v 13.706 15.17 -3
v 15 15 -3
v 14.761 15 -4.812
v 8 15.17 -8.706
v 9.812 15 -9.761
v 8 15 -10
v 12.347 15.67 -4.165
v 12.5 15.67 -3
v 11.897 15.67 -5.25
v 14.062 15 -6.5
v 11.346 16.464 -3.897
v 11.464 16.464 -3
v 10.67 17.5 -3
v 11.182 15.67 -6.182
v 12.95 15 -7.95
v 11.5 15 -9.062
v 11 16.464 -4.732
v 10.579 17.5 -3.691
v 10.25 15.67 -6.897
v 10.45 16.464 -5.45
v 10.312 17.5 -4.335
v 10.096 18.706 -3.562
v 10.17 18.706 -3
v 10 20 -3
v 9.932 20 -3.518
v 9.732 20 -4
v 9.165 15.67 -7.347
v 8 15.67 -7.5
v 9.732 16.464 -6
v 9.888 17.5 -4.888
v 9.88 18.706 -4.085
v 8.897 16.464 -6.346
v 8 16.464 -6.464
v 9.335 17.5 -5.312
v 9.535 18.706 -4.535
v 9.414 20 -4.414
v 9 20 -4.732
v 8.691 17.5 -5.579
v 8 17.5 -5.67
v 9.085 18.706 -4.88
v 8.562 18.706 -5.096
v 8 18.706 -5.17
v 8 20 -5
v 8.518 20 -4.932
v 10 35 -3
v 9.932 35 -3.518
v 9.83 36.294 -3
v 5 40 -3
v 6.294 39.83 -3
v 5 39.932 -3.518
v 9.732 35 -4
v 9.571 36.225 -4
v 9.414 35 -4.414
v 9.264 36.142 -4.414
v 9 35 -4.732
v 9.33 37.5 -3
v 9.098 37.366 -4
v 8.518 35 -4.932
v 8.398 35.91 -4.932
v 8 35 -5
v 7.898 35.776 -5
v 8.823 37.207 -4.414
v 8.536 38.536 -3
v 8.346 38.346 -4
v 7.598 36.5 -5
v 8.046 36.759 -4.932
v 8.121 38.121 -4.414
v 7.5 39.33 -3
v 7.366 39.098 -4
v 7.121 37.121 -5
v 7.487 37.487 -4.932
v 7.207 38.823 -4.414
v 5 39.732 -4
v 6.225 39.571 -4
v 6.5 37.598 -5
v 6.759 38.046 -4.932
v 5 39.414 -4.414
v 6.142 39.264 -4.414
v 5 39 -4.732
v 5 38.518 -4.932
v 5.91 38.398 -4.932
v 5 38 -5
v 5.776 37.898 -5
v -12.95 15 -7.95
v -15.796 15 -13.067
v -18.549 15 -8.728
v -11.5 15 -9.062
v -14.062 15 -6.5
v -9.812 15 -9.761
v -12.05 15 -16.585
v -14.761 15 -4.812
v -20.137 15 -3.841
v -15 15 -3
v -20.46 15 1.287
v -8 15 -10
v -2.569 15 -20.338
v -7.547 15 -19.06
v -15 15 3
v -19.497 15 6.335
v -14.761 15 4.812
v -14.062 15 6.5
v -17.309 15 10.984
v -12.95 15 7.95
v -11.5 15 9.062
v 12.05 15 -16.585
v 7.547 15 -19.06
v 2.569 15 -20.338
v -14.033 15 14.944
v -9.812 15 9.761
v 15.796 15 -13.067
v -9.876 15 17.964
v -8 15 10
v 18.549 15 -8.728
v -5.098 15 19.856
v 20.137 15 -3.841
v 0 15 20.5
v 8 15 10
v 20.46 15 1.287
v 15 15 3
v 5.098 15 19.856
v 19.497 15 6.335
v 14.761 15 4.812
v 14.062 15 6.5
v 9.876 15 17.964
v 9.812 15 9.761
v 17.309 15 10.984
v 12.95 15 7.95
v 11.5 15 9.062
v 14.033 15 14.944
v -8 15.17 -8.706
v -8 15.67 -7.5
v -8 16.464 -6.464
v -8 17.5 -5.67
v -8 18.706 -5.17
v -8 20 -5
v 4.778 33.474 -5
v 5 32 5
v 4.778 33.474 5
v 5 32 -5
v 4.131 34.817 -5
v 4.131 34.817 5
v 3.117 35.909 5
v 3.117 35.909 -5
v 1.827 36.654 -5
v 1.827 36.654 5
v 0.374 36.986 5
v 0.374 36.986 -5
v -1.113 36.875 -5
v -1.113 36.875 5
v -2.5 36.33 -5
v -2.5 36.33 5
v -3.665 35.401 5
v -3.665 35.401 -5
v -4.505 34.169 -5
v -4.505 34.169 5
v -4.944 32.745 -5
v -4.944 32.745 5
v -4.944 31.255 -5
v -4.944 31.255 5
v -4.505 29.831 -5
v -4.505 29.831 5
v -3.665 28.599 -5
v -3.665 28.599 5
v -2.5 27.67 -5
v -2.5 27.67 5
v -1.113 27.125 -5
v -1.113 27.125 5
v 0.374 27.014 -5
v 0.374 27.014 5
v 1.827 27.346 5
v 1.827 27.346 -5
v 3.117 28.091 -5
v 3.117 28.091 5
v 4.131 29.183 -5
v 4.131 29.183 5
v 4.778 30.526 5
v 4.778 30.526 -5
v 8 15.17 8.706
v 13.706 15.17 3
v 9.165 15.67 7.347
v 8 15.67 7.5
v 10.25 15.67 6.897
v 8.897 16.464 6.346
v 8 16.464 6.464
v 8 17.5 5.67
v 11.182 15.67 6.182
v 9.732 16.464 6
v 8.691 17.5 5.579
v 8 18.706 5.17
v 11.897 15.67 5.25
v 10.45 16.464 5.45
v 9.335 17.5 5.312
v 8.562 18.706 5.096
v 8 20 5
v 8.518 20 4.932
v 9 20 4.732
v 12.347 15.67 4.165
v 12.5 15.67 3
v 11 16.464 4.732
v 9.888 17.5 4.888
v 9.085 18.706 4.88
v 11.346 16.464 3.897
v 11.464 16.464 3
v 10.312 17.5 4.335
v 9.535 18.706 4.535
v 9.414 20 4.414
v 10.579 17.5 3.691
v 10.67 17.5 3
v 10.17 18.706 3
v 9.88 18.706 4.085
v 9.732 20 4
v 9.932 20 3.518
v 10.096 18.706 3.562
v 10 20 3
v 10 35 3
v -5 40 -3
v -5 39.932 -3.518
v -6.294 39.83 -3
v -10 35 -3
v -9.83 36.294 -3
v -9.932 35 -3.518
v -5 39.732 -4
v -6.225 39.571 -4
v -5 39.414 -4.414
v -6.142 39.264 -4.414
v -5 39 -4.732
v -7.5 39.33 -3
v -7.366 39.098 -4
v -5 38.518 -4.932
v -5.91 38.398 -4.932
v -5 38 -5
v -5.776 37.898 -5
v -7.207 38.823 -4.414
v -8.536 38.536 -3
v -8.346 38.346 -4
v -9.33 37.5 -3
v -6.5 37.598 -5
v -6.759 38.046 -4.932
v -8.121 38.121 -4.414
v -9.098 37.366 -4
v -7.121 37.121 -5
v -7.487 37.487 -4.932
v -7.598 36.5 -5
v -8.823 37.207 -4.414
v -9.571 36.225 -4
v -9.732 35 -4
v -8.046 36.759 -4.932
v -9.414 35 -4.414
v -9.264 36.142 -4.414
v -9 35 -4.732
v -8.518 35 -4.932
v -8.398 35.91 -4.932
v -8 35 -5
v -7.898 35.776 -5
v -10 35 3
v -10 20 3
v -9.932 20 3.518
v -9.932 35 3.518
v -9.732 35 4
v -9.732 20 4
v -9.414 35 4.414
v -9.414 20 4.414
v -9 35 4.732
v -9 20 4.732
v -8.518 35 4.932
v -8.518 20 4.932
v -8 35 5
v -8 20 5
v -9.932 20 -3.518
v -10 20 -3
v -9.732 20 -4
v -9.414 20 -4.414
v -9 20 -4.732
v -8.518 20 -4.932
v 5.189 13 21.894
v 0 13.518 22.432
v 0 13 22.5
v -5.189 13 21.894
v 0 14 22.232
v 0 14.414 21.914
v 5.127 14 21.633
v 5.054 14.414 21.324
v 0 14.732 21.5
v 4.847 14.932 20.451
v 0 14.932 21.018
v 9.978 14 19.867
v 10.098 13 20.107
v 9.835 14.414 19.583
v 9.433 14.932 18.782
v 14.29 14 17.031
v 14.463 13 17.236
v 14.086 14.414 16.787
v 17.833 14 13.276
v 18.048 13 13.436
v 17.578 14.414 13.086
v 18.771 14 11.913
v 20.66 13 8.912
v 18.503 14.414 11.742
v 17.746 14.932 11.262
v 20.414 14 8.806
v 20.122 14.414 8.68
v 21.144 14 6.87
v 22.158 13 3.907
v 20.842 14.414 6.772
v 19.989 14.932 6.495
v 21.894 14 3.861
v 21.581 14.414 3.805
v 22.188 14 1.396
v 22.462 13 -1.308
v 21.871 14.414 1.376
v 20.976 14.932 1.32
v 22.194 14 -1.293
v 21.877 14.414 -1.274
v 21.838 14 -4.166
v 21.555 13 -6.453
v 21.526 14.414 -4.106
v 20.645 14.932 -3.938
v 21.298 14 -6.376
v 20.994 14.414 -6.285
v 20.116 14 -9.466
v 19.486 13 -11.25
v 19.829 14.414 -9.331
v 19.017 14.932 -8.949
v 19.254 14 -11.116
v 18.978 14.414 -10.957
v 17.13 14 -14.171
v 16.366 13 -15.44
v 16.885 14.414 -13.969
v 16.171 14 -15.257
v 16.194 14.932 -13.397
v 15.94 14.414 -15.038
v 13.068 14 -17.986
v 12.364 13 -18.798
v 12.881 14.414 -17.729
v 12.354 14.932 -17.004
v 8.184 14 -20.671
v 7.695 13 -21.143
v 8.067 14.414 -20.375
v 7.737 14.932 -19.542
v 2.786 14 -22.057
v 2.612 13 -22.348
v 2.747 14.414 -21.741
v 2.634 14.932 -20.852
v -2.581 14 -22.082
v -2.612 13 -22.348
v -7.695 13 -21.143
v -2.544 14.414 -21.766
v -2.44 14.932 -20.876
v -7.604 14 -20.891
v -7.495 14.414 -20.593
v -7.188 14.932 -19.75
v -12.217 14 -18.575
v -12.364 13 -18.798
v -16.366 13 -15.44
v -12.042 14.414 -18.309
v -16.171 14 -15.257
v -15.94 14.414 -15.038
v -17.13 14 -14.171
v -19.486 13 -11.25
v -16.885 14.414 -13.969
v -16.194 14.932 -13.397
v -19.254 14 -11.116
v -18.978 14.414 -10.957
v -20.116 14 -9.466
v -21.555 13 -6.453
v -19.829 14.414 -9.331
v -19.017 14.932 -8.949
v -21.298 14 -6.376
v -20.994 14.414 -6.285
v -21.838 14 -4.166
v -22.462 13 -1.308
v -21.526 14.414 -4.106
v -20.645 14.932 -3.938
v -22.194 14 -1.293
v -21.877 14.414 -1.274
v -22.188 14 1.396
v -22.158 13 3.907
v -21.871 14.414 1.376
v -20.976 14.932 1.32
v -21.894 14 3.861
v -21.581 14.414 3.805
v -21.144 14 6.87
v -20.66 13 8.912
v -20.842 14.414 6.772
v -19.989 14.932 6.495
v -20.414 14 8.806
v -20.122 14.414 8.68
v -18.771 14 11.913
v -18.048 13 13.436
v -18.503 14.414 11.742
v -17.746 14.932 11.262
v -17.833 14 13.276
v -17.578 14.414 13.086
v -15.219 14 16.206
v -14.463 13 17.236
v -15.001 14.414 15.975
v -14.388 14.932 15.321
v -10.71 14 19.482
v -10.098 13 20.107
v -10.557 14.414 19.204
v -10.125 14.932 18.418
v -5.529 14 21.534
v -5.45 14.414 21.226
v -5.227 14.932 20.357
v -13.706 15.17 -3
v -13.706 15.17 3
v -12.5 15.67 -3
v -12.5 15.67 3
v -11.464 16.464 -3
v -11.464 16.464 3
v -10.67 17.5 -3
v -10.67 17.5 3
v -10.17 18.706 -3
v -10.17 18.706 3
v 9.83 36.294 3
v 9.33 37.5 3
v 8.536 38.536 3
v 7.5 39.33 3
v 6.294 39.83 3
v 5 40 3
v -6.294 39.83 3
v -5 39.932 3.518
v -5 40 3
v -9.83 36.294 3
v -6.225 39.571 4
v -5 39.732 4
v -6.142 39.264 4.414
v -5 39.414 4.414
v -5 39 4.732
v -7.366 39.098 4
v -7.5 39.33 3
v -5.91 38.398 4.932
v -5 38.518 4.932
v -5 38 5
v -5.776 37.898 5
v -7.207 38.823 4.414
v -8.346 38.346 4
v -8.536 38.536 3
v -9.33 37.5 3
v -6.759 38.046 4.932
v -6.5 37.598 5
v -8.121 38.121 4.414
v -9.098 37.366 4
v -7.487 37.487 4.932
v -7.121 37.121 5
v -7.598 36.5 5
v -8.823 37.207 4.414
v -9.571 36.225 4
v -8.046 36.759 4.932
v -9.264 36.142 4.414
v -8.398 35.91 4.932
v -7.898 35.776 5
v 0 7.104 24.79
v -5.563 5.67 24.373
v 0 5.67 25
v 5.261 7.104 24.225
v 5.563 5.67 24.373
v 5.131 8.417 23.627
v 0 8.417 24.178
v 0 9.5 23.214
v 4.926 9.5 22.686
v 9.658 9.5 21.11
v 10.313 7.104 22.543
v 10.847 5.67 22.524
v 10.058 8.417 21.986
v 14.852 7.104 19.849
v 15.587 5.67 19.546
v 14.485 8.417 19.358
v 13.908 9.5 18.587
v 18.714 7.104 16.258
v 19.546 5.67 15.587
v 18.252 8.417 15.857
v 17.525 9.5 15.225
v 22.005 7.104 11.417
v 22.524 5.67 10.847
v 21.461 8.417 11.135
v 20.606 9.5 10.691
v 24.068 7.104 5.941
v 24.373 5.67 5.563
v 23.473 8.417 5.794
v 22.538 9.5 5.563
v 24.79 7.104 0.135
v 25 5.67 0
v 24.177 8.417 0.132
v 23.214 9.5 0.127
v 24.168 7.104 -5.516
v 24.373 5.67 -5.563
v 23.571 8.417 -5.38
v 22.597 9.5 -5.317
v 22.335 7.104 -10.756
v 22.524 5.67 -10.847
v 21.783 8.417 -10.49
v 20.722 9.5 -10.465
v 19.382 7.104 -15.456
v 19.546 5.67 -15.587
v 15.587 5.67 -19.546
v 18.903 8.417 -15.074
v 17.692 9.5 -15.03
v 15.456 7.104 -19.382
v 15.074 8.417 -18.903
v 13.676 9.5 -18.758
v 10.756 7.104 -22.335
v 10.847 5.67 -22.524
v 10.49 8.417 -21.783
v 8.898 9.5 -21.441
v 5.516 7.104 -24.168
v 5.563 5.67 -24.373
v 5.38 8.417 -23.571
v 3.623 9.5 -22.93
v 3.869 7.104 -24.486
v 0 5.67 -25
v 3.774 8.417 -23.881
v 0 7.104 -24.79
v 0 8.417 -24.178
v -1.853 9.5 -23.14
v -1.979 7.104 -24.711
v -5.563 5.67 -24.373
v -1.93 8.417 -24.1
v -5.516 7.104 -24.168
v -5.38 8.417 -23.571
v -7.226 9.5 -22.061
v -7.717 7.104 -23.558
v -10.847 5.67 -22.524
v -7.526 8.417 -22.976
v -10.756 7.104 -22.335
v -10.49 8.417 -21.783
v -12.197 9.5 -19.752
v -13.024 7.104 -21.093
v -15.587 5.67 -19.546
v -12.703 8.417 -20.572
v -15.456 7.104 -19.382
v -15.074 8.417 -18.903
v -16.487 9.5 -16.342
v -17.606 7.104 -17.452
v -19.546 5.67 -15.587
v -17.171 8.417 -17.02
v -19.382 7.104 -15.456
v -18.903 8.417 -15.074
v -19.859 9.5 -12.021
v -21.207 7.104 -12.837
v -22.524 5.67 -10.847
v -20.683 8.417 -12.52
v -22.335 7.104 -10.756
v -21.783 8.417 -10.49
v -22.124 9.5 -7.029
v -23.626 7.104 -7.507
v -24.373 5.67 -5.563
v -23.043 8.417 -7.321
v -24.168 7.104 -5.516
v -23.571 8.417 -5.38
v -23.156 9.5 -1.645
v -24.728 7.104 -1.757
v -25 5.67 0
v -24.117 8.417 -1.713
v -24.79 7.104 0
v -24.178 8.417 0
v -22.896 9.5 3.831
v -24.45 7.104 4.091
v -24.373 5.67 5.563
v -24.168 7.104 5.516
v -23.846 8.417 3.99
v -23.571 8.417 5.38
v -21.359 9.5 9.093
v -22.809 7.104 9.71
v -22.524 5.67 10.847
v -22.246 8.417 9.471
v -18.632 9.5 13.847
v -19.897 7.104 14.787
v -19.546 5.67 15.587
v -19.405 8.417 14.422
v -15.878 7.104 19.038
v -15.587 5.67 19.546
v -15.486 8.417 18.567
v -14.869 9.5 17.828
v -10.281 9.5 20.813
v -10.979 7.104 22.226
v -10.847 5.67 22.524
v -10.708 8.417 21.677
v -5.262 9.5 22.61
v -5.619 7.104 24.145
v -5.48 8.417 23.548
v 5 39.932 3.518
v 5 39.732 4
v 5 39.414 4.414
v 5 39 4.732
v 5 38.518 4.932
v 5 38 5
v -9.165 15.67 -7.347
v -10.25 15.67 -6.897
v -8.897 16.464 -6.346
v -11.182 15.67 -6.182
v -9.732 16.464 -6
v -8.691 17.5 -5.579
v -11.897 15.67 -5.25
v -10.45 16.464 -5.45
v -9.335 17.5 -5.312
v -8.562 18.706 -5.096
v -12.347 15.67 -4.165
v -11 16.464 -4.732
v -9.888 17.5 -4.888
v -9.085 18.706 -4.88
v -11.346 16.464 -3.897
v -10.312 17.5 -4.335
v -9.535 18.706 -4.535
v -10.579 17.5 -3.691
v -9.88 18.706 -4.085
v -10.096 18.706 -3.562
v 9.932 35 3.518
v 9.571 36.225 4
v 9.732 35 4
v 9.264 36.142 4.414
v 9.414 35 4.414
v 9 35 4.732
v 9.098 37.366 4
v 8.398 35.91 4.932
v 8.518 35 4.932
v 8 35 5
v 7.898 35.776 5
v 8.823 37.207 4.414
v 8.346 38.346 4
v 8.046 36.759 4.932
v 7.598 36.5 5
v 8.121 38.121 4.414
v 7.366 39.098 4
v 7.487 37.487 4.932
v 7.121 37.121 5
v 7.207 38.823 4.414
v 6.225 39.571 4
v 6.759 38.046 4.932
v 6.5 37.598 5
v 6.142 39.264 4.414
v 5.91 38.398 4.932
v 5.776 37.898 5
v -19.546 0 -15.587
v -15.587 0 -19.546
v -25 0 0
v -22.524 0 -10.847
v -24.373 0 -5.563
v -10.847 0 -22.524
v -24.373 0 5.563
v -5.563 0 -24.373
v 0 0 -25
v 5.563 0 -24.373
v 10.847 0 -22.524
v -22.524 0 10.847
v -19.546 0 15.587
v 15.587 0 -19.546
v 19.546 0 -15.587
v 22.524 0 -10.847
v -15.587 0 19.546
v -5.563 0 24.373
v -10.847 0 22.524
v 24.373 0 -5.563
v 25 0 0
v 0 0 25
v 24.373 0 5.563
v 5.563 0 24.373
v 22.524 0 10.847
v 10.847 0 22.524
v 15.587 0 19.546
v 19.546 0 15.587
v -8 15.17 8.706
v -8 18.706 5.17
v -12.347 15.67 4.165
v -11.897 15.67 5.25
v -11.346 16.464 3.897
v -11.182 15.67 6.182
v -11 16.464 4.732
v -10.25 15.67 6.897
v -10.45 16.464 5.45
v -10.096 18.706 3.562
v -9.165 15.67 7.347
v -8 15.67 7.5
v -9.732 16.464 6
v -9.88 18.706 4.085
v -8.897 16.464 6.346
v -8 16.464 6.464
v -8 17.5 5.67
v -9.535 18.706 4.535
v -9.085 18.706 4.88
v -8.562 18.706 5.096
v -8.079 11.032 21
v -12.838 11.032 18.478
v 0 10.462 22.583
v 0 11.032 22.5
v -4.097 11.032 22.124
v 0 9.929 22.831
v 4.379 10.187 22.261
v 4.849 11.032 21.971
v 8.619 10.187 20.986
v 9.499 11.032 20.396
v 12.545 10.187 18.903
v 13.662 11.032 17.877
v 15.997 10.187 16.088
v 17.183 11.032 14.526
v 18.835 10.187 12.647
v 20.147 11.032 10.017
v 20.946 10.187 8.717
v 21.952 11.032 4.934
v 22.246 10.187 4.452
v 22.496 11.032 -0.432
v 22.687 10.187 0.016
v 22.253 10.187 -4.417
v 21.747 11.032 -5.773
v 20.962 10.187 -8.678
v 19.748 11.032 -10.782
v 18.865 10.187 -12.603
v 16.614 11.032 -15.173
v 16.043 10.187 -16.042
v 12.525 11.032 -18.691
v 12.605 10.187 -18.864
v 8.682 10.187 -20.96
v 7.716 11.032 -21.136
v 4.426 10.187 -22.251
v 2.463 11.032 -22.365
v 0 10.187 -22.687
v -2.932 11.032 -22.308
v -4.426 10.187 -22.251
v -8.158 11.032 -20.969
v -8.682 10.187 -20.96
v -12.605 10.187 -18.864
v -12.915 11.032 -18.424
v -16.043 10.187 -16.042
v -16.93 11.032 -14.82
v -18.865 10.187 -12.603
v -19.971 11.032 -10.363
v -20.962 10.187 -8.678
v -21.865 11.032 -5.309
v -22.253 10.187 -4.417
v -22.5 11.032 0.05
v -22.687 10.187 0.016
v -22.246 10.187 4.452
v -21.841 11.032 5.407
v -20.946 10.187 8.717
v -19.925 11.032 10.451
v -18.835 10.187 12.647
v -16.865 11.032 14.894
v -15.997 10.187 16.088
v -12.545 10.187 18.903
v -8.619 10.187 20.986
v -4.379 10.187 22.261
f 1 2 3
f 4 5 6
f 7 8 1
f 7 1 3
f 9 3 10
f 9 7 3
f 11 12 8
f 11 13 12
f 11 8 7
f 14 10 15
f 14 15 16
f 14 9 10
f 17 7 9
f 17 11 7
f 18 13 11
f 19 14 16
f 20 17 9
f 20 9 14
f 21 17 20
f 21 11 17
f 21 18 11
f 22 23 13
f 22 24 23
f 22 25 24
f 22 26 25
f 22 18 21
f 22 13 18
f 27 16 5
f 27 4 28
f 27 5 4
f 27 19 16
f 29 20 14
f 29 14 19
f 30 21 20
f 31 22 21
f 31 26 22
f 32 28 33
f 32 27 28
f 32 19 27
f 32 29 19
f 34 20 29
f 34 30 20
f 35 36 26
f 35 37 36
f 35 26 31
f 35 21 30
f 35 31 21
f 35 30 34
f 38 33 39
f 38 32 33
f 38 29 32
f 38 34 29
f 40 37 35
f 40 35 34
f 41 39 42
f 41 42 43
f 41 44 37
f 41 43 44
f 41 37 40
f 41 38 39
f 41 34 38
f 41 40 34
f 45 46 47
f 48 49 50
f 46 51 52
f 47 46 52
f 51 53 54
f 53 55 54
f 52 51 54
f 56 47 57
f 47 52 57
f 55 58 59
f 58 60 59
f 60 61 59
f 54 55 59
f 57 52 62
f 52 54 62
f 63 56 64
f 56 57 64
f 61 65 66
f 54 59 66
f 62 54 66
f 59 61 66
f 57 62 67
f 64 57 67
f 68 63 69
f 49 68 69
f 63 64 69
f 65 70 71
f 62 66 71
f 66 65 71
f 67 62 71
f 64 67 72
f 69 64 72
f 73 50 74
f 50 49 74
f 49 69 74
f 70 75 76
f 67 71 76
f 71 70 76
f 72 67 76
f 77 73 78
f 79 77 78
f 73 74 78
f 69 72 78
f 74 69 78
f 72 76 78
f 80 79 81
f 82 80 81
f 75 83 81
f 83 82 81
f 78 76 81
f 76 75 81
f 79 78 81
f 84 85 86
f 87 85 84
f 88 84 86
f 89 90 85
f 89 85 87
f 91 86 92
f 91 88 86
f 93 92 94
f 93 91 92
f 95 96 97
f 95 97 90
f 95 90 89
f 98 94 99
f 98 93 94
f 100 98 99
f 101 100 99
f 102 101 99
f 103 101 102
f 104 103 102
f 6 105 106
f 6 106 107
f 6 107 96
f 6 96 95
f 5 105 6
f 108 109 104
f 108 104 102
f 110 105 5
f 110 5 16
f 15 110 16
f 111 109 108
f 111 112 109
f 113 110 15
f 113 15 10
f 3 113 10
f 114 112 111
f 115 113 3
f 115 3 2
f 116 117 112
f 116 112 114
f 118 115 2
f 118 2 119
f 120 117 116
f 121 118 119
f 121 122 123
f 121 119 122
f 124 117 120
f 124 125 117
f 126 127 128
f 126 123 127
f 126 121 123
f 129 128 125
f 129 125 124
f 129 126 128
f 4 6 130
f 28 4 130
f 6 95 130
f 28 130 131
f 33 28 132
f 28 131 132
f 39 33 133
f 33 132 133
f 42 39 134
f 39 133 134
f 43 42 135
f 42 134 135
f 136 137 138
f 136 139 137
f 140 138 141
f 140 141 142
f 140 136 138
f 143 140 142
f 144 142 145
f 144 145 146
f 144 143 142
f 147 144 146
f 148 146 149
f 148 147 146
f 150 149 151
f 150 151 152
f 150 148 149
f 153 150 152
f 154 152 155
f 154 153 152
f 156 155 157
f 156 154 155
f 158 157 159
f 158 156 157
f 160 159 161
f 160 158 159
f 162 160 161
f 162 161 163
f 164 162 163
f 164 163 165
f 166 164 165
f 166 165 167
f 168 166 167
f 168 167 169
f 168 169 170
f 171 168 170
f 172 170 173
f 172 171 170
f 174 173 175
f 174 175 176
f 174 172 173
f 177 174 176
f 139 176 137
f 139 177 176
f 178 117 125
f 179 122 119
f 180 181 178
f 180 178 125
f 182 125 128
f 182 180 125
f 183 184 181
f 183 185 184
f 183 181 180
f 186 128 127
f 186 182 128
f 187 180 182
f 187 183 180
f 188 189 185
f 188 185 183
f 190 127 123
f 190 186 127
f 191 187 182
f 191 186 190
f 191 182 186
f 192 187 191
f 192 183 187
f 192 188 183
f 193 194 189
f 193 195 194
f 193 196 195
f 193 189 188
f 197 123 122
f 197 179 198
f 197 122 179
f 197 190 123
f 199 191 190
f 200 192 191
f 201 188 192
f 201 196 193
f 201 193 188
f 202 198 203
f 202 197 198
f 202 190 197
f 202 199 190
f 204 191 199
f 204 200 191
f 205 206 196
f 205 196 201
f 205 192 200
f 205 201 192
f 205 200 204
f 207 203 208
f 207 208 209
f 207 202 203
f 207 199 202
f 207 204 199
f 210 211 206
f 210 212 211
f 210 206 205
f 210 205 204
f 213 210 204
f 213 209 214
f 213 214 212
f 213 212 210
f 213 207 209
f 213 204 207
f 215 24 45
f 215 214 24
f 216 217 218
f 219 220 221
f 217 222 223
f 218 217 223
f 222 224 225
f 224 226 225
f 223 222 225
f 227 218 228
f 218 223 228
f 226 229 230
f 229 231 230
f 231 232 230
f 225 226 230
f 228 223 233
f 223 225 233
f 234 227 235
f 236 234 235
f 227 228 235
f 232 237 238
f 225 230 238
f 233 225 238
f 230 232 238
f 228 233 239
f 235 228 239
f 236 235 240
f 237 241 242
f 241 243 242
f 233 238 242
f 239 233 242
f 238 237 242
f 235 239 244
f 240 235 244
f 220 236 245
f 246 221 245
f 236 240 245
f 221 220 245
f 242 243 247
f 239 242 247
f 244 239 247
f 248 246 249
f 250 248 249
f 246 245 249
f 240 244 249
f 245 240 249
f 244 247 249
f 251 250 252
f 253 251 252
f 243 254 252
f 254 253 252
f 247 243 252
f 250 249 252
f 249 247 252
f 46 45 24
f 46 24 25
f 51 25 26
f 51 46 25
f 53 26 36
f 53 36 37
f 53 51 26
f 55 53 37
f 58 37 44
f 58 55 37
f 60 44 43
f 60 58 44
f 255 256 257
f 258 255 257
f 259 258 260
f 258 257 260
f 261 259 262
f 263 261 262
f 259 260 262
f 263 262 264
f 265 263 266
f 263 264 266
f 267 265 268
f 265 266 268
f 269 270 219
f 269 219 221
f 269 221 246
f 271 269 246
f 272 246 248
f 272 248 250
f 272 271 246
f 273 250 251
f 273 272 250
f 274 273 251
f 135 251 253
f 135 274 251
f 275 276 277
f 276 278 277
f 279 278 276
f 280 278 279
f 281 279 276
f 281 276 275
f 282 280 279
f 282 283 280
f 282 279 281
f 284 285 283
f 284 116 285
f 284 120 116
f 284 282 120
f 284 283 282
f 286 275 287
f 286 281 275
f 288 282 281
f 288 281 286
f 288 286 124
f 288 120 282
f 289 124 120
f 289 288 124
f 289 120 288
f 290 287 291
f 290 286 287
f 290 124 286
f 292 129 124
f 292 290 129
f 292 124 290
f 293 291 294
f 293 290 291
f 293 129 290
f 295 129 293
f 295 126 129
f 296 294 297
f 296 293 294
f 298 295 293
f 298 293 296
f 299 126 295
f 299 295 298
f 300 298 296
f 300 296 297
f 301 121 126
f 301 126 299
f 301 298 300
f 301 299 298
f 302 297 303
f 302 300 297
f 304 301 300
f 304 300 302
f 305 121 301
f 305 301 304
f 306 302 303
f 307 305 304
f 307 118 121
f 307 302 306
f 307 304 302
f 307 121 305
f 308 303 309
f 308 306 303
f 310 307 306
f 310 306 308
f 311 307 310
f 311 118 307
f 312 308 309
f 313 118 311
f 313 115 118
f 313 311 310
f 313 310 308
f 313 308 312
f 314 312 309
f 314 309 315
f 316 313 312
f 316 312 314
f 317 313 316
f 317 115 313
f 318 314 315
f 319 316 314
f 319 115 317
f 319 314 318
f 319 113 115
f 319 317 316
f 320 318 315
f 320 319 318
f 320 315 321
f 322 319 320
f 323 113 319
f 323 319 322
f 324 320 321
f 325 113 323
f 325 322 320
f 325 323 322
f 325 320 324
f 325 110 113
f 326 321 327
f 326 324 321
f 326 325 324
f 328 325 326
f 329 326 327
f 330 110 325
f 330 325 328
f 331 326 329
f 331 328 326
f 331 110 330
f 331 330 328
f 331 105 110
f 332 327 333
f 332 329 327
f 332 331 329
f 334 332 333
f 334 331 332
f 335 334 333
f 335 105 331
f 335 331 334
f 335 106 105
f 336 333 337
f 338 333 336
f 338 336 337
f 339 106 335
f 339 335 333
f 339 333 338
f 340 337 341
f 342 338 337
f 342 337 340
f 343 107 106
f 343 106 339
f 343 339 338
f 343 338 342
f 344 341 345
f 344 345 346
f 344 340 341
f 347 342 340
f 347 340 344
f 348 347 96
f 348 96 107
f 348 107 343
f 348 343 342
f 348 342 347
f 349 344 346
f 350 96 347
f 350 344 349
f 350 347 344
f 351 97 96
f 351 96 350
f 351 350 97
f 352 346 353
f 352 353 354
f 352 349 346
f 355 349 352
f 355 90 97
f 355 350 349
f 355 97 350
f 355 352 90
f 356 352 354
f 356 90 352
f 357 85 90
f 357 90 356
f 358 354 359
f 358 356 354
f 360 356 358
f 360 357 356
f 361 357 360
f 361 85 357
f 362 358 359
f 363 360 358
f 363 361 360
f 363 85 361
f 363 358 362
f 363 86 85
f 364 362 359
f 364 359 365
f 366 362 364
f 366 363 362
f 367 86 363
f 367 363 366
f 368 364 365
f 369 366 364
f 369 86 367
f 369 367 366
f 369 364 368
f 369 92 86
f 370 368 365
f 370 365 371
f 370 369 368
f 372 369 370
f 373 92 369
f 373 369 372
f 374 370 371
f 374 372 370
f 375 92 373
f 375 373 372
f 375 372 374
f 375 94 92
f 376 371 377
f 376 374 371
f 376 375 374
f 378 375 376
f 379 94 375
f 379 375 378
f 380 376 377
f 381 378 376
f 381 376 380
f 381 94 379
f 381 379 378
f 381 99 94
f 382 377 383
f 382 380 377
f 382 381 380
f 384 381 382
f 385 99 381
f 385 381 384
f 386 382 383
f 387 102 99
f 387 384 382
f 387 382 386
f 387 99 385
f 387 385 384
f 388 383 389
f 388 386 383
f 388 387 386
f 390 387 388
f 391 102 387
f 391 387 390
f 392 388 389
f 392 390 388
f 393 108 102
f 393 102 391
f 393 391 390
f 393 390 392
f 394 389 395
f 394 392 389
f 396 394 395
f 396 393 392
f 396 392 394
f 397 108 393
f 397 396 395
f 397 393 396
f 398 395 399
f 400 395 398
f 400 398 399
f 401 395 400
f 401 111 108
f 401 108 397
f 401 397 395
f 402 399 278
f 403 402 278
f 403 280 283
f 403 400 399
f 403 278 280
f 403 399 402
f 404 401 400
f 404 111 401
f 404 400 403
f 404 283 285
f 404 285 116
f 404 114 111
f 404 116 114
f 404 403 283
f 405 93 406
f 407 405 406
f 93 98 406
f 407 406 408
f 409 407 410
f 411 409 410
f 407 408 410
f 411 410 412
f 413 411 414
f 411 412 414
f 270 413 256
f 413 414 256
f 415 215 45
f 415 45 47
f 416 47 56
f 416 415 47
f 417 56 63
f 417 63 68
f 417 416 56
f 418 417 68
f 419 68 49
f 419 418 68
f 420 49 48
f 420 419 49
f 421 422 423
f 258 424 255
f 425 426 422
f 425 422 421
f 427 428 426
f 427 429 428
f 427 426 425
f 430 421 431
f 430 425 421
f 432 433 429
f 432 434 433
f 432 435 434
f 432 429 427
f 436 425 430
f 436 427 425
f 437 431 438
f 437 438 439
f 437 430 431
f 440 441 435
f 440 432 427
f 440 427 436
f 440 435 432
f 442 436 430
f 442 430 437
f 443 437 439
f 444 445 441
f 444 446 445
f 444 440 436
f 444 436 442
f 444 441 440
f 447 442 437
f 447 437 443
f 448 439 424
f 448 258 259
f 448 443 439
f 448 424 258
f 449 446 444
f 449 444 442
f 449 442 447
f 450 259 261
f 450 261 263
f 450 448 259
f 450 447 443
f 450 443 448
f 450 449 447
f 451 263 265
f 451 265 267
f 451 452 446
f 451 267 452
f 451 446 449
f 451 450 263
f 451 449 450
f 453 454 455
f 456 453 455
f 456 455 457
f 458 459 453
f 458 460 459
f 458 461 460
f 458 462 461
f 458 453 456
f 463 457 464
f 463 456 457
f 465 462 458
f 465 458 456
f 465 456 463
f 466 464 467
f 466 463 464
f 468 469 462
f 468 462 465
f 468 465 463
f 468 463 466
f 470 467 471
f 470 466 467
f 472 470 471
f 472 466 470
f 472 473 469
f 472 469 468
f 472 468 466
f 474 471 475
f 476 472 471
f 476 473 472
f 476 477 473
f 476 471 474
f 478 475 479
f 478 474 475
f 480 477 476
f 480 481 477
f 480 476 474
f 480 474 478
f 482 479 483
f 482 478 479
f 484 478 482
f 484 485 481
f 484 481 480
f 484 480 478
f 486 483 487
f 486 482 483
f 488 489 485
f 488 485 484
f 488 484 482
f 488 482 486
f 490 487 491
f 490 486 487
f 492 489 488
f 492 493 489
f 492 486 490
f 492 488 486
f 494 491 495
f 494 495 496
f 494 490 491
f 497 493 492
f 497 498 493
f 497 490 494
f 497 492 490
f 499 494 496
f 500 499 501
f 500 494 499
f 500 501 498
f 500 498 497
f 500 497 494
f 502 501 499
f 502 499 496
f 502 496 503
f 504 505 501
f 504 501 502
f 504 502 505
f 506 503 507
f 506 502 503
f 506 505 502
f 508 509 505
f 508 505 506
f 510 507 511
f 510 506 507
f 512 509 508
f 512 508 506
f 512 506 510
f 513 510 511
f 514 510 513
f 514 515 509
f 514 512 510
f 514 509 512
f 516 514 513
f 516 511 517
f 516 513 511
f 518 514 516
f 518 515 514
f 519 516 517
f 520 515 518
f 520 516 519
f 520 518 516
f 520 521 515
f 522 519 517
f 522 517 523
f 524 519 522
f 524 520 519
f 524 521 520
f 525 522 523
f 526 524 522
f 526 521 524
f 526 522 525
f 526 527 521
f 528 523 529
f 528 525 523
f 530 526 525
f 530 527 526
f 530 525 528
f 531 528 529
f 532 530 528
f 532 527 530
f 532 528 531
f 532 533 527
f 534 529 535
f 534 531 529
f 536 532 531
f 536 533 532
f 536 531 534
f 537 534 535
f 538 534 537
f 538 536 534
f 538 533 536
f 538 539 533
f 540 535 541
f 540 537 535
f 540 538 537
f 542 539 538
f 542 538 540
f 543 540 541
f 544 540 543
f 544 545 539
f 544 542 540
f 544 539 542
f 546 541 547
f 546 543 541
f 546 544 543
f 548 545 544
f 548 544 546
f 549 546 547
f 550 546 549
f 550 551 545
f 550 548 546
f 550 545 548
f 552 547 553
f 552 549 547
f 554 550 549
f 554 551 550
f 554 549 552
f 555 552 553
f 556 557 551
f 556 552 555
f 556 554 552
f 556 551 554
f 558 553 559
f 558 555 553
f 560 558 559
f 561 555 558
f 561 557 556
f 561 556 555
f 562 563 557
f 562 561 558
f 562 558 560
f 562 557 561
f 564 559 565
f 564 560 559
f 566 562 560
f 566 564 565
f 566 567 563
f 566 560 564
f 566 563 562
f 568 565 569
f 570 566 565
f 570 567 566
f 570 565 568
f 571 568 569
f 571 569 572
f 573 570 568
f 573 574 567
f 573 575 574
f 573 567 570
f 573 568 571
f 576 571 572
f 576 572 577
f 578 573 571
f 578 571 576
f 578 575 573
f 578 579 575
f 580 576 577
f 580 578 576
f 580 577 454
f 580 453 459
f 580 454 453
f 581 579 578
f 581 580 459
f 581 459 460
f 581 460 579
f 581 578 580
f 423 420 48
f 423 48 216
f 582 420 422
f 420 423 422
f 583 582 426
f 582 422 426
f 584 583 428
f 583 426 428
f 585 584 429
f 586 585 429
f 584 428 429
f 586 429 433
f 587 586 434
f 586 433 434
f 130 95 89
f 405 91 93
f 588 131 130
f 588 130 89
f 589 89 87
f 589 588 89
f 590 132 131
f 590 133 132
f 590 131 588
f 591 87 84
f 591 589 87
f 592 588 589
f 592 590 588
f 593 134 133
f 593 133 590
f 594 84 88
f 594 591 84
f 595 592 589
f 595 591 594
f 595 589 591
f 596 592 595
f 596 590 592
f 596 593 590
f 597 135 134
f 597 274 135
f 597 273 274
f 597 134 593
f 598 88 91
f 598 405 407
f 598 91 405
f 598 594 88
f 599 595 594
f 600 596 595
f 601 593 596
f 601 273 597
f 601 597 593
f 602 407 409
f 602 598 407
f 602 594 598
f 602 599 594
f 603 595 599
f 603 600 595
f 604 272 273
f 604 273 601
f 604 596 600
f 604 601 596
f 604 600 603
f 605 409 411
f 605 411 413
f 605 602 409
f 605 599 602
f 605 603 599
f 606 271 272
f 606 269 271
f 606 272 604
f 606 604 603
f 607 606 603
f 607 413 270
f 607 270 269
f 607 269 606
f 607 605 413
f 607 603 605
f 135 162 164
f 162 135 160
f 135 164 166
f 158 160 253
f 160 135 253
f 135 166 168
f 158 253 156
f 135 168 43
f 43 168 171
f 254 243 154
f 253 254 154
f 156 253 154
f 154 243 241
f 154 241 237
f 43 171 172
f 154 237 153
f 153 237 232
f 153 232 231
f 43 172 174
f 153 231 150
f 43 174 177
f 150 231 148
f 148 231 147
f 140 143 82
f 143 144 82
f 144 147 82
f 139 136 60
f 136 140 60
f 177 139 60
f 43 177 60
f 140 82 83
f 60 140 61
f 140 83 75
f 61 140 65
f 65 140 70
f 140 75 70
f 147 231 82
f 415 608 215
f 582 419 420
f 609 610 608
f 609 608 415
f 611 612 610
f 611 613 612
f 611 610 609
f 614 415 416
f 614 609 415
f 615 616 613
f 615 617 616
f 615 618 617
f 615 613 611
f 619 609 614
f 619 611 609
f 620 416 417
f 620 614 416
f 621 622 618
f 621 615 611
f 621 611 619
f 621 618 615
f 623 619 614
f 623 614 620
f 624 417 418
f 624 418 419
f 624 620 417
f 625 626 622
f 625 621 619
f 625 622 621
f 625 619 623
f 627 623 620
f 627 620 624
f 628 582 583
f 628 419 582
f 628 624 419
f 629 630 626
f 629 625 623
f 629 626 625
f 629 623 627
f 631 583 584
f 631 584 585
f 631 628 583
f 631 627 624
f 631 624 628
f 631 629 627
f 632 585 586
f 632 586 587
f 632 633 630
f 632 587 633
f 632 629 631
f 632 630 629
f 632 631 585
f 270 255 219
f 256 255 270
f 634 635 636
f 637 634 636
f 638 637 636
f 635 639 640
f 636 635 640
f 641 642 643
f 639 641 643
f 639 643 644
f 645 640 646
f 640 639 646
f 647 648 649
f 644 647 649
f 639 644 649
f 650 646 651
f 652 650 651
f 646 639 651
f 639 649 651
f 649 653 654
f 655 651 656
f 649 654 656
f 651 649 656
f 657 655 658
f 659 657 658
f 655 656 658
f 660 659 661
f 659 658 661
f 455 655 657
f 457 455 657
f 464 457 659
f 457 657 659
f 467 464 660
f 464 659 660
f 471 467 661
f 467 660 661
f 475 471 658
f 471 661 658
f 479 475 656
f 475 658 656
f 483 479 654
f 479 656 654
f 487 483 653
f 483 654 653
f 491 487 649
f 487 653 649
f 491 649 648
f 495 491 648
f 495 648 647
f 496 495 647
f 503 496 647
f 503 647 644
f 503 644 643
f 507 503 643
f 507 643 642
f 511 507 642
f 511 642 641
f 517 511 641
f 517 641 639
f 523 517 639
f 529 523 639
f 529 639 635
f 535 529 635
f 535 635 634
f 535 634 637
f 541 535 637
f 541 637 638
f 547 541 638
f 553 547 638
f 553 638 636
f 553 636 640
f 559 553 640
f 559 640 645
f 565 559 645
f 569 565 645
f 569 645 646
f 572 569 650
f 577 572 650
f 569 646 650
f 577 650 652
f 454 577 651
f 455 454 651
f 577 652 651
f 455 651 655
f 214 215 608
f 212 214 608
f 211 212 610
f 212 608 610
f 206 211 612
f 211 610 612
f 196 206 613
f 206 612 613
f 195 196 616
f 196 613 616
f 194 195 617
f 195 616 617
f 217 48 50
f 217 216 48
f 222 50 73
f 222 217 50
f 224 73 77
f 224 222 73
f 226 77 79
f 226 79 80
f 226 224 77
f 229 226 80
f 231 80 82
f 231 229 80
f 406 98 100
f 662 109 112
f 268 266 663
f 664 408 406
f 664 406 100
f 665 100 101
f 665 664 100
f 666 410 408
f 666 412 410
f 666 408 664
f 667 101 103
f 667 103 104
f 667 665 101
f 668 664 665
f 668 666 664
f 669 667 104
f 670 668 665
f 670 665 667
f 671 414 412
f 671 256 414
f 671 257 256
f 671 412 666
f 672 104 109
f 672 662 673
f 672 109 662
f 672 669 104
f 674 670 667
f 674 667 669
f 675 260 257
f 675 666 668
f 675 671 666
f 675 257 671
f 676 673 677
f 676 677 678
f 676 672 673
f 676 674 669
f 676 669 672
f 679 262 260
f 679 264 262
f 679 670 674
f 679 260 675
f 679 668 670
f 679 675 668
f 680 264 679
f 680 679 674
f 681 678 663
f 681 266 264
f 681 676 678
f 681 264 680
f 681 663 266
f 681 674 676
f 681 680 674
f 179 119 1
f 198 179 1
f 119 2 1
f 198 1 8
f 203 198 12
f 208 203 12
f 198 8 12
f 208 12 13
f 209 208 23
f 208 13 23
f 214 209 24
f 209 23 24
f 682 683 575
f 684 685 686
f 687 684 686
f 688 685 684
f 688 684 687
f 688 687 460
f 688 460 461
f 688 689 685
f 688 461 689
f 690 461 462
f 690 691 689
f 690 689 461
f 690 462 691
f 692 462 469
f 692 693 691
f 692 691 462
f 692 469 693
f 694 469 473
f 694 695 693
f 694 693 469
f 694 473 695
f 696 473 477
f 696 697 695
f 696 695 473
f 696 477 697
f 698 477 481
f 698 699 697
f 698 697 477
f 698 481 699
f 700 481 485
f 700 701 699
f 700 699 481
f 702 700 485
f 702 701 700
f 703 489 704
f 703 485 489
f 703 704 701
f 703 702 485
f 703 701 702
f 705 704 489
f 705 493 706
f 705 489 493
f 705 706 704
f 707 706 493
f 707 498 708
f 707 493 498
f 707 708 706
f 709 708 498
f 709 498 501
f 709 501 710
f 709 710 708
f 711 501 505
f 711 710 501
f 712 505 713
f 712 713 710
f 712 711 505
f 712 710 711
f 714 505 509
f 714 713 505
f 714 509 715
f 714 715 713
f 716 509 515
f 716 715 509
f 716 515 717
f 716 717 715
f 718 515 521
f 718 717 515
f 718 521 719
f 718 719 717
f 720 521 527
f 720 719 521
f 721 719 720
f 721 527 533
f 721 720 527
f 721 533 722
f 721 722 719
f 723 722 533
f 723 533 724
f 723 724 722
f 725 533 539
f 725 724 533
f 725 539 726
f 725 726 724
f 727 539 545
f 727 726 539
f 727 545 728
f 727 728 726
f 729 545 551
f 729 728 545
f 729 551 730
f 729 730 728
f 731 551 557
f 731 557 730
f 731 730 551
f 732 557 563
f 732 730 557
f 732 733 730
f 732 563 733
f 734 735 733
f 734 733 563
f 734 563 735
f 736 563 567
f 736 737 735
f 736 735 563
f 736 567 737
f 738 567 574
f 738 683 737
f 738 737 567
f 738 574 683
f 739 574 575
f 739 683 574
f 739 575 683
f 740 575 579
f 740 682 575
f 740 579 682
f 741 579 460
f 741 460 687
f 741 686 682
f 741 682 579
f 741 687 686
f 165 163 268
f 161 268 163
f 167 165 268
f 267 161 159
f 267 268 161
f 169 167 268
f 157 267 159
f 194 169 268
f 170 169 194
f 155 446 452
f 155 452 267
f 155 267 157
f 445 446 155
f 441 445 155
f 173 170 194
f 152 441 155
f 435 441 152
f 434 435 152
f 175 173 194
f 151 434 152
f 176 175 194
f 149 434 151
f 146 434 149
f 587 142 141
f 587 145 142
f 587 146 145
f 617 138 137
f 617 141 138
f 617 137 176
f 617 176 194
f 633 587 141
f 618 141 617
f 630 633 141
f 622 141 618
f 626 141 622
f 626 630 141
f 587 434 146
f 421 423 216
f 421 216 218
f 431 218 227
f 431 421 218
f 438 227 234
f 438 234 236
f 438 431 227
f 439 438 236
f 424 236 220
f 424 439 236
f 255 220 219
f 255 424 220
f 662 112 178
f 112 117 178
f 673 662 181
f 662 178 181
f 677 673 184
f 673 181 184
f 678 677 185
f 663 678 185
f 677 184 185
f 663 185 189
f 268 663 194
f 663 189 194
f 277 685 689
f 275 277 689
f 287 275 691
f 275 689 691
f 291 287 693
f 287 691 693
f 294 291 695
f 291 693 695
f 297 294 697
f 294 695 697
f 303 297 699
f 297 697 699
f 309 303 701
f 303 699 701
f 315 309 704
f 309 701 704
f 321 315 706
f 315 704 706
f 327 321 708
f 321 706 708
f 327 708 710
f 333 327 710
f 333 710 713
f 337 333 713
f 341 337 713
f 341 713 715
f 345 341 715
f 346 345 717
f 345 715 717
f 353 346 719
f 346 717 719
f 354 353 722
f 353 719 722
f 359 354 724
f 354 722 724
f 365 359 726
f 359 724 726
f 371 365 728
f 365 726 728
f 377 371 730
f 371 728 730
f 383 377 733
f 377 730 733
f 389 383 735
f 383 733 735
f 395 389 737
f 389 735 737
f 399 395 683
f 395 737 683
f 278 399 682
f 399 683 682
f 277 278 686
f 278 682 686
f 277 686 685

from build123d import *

# Parameters (mm, degrees)
SKETCH1_R           = 25
BOSS_EXTRUDE1_DEPTH = 10
SKETCH2_R           = 22.5
BOSS_EXTRUDE2_DEPTH = 5
FILLET3_R           = 5
FILLET4_R           = 2
FILLET5_R           = 2
SKETCH3_R           = 5
BOSS_EXTRUDE3_DEPTH = 5
FILLET6_R           = 2
FILLET7_R           = 2
FILLET8_R           = 5


with BuildPart() as part:
    # Sketch1 → Boss-Extrude1 (new body)
    with BuildSketch(Plane(origin=(0, 0, 0), x_dir=(1, 0, 0), z_dir=(0, 1, 0))):
        with Locations(Location((0, 0, 0), (0, 0, 270))):
            Circle(SKETCH1_R)
    extrude(amount=BOSS_EXTRUDE1_DEPTH)

    # Sketch2 → Boss-Extrude2 (add)
    with BuildSketch(Plane(origin=(0, 10, 0), x_dir=(1, 0, 0), z_dir=(0, 1, 0))):
        with Locations(Location((0, 0, 0), (0, 0, 270))):
            Circle(SKETCH2_R)
    extrude(amount=BOSS_EXTRUDE2_DEPTH)

    # Fillet3
    # the kernel refuses this fillet: 5 mm, written as the material it takes off along each edge
    with BuildSketch(Plane(origin=(0, 10, 0), x_dir=(0, 0, 1), z_dir=(-1, 0, 0))) as fillet3_piece_1:
        with BuildLine():
            CenterArc((20, -4.330127019), FILLET3_R, 0, 60)
            Line((22.5, 0), (22.55, 0.08660254))
            ThreePointArc((22.55, 0.08660254), (23.75, 0.1), (25, 0.1))
            Line((25, 0.1), (25.1, 0))
            Line((25.1, 0), (25.1, -4.330127019))
            Line((25.1, -4.330127019), (25, -4.330127019))
        make_face()
    revolve(axis=Axis((0, 10, 0), (0, 1, 0)), mode=Mode.SUBTRACT)

    # Fillet4
    fillet4_edges = [part.edges().sort_by_distance(p)[0] for p in [
        (0, 15, -22.5),
    ]]
    fillet(fillet4_edges, radius=FILLET4_R)

    # Fillet5
    fillet5_edges = [part.edges().sort_by_distance(p)[0] for p in [
        (0, 10, -22.5),
    ]]
    fillet(fillet5_edges, radius=FILLET5_R)

    # Sketch3 → Boss-Extrude3 (add, symmetric)
    with BuildSketch(Plane.XY):
        with BuildLine():
            Line((-10, 15), (10, 15))
            Line((10, 15), (10, 35))
            ThreePointArc((10, 35), (8.535533906, 38.535533906), (5, 40))
            Line((5, 40), (-5, 40))
            ThreePointArc((-5, 40), (-8.535533906, 38.535533906), (-10, 35))
            Line((-10, 35), (-10, 15))
        make_face()
        with Locations((0, 32)):
            Circle(SKETCH3_R, mode=Mode.SUBTRACT)
    extrude(amount=BOSS_EXTRUDE3_DEPTH, both=True)

    # Fillet6
    fillet6_edges = [part.edges().sort_by_distance(p)[0] for p in [
        (-10, 25, 5),
        (10, 25, 5),
        (8.535533906, 38.535533906, 5),
        (0, 40, 5),
        (-8.535533906, 38.535533906, 5),
    ]]
    fillet(fillet6_edges, radius=FILLET6_R)

    # Fillet7
    fillet7_edges = [part.edges().sort_by_distance(p)[0] for p in [
        (-10, 25, -5),
        (-8.535533906, 38.535533906, -5),
        (0, 40, -5),
        (8.535533906, 38.535533906, -5),
        (10, 25, -5),
    ]]
    fillet(fillet7_edges, radius=FILLET7_R)

    # Fillet8
    fillet8_edges = [part.edges().sort_by_distance(p)[0] for p in [
        (0, 15, 5),
        (9.414213562, 15, 4.414213562),
        (-9.414213562, 15, 4.414213562),
        (10, 15, 0),
        (0, 15, -5),
        (-10, 15, 0),
        (9.414213562, 15, -4.414213562),
        (-9.414213562, 15, -4.414213562),
    ]]
    fillet(fillet8_edges, radius=FILLET8_R)


solid = part.part
